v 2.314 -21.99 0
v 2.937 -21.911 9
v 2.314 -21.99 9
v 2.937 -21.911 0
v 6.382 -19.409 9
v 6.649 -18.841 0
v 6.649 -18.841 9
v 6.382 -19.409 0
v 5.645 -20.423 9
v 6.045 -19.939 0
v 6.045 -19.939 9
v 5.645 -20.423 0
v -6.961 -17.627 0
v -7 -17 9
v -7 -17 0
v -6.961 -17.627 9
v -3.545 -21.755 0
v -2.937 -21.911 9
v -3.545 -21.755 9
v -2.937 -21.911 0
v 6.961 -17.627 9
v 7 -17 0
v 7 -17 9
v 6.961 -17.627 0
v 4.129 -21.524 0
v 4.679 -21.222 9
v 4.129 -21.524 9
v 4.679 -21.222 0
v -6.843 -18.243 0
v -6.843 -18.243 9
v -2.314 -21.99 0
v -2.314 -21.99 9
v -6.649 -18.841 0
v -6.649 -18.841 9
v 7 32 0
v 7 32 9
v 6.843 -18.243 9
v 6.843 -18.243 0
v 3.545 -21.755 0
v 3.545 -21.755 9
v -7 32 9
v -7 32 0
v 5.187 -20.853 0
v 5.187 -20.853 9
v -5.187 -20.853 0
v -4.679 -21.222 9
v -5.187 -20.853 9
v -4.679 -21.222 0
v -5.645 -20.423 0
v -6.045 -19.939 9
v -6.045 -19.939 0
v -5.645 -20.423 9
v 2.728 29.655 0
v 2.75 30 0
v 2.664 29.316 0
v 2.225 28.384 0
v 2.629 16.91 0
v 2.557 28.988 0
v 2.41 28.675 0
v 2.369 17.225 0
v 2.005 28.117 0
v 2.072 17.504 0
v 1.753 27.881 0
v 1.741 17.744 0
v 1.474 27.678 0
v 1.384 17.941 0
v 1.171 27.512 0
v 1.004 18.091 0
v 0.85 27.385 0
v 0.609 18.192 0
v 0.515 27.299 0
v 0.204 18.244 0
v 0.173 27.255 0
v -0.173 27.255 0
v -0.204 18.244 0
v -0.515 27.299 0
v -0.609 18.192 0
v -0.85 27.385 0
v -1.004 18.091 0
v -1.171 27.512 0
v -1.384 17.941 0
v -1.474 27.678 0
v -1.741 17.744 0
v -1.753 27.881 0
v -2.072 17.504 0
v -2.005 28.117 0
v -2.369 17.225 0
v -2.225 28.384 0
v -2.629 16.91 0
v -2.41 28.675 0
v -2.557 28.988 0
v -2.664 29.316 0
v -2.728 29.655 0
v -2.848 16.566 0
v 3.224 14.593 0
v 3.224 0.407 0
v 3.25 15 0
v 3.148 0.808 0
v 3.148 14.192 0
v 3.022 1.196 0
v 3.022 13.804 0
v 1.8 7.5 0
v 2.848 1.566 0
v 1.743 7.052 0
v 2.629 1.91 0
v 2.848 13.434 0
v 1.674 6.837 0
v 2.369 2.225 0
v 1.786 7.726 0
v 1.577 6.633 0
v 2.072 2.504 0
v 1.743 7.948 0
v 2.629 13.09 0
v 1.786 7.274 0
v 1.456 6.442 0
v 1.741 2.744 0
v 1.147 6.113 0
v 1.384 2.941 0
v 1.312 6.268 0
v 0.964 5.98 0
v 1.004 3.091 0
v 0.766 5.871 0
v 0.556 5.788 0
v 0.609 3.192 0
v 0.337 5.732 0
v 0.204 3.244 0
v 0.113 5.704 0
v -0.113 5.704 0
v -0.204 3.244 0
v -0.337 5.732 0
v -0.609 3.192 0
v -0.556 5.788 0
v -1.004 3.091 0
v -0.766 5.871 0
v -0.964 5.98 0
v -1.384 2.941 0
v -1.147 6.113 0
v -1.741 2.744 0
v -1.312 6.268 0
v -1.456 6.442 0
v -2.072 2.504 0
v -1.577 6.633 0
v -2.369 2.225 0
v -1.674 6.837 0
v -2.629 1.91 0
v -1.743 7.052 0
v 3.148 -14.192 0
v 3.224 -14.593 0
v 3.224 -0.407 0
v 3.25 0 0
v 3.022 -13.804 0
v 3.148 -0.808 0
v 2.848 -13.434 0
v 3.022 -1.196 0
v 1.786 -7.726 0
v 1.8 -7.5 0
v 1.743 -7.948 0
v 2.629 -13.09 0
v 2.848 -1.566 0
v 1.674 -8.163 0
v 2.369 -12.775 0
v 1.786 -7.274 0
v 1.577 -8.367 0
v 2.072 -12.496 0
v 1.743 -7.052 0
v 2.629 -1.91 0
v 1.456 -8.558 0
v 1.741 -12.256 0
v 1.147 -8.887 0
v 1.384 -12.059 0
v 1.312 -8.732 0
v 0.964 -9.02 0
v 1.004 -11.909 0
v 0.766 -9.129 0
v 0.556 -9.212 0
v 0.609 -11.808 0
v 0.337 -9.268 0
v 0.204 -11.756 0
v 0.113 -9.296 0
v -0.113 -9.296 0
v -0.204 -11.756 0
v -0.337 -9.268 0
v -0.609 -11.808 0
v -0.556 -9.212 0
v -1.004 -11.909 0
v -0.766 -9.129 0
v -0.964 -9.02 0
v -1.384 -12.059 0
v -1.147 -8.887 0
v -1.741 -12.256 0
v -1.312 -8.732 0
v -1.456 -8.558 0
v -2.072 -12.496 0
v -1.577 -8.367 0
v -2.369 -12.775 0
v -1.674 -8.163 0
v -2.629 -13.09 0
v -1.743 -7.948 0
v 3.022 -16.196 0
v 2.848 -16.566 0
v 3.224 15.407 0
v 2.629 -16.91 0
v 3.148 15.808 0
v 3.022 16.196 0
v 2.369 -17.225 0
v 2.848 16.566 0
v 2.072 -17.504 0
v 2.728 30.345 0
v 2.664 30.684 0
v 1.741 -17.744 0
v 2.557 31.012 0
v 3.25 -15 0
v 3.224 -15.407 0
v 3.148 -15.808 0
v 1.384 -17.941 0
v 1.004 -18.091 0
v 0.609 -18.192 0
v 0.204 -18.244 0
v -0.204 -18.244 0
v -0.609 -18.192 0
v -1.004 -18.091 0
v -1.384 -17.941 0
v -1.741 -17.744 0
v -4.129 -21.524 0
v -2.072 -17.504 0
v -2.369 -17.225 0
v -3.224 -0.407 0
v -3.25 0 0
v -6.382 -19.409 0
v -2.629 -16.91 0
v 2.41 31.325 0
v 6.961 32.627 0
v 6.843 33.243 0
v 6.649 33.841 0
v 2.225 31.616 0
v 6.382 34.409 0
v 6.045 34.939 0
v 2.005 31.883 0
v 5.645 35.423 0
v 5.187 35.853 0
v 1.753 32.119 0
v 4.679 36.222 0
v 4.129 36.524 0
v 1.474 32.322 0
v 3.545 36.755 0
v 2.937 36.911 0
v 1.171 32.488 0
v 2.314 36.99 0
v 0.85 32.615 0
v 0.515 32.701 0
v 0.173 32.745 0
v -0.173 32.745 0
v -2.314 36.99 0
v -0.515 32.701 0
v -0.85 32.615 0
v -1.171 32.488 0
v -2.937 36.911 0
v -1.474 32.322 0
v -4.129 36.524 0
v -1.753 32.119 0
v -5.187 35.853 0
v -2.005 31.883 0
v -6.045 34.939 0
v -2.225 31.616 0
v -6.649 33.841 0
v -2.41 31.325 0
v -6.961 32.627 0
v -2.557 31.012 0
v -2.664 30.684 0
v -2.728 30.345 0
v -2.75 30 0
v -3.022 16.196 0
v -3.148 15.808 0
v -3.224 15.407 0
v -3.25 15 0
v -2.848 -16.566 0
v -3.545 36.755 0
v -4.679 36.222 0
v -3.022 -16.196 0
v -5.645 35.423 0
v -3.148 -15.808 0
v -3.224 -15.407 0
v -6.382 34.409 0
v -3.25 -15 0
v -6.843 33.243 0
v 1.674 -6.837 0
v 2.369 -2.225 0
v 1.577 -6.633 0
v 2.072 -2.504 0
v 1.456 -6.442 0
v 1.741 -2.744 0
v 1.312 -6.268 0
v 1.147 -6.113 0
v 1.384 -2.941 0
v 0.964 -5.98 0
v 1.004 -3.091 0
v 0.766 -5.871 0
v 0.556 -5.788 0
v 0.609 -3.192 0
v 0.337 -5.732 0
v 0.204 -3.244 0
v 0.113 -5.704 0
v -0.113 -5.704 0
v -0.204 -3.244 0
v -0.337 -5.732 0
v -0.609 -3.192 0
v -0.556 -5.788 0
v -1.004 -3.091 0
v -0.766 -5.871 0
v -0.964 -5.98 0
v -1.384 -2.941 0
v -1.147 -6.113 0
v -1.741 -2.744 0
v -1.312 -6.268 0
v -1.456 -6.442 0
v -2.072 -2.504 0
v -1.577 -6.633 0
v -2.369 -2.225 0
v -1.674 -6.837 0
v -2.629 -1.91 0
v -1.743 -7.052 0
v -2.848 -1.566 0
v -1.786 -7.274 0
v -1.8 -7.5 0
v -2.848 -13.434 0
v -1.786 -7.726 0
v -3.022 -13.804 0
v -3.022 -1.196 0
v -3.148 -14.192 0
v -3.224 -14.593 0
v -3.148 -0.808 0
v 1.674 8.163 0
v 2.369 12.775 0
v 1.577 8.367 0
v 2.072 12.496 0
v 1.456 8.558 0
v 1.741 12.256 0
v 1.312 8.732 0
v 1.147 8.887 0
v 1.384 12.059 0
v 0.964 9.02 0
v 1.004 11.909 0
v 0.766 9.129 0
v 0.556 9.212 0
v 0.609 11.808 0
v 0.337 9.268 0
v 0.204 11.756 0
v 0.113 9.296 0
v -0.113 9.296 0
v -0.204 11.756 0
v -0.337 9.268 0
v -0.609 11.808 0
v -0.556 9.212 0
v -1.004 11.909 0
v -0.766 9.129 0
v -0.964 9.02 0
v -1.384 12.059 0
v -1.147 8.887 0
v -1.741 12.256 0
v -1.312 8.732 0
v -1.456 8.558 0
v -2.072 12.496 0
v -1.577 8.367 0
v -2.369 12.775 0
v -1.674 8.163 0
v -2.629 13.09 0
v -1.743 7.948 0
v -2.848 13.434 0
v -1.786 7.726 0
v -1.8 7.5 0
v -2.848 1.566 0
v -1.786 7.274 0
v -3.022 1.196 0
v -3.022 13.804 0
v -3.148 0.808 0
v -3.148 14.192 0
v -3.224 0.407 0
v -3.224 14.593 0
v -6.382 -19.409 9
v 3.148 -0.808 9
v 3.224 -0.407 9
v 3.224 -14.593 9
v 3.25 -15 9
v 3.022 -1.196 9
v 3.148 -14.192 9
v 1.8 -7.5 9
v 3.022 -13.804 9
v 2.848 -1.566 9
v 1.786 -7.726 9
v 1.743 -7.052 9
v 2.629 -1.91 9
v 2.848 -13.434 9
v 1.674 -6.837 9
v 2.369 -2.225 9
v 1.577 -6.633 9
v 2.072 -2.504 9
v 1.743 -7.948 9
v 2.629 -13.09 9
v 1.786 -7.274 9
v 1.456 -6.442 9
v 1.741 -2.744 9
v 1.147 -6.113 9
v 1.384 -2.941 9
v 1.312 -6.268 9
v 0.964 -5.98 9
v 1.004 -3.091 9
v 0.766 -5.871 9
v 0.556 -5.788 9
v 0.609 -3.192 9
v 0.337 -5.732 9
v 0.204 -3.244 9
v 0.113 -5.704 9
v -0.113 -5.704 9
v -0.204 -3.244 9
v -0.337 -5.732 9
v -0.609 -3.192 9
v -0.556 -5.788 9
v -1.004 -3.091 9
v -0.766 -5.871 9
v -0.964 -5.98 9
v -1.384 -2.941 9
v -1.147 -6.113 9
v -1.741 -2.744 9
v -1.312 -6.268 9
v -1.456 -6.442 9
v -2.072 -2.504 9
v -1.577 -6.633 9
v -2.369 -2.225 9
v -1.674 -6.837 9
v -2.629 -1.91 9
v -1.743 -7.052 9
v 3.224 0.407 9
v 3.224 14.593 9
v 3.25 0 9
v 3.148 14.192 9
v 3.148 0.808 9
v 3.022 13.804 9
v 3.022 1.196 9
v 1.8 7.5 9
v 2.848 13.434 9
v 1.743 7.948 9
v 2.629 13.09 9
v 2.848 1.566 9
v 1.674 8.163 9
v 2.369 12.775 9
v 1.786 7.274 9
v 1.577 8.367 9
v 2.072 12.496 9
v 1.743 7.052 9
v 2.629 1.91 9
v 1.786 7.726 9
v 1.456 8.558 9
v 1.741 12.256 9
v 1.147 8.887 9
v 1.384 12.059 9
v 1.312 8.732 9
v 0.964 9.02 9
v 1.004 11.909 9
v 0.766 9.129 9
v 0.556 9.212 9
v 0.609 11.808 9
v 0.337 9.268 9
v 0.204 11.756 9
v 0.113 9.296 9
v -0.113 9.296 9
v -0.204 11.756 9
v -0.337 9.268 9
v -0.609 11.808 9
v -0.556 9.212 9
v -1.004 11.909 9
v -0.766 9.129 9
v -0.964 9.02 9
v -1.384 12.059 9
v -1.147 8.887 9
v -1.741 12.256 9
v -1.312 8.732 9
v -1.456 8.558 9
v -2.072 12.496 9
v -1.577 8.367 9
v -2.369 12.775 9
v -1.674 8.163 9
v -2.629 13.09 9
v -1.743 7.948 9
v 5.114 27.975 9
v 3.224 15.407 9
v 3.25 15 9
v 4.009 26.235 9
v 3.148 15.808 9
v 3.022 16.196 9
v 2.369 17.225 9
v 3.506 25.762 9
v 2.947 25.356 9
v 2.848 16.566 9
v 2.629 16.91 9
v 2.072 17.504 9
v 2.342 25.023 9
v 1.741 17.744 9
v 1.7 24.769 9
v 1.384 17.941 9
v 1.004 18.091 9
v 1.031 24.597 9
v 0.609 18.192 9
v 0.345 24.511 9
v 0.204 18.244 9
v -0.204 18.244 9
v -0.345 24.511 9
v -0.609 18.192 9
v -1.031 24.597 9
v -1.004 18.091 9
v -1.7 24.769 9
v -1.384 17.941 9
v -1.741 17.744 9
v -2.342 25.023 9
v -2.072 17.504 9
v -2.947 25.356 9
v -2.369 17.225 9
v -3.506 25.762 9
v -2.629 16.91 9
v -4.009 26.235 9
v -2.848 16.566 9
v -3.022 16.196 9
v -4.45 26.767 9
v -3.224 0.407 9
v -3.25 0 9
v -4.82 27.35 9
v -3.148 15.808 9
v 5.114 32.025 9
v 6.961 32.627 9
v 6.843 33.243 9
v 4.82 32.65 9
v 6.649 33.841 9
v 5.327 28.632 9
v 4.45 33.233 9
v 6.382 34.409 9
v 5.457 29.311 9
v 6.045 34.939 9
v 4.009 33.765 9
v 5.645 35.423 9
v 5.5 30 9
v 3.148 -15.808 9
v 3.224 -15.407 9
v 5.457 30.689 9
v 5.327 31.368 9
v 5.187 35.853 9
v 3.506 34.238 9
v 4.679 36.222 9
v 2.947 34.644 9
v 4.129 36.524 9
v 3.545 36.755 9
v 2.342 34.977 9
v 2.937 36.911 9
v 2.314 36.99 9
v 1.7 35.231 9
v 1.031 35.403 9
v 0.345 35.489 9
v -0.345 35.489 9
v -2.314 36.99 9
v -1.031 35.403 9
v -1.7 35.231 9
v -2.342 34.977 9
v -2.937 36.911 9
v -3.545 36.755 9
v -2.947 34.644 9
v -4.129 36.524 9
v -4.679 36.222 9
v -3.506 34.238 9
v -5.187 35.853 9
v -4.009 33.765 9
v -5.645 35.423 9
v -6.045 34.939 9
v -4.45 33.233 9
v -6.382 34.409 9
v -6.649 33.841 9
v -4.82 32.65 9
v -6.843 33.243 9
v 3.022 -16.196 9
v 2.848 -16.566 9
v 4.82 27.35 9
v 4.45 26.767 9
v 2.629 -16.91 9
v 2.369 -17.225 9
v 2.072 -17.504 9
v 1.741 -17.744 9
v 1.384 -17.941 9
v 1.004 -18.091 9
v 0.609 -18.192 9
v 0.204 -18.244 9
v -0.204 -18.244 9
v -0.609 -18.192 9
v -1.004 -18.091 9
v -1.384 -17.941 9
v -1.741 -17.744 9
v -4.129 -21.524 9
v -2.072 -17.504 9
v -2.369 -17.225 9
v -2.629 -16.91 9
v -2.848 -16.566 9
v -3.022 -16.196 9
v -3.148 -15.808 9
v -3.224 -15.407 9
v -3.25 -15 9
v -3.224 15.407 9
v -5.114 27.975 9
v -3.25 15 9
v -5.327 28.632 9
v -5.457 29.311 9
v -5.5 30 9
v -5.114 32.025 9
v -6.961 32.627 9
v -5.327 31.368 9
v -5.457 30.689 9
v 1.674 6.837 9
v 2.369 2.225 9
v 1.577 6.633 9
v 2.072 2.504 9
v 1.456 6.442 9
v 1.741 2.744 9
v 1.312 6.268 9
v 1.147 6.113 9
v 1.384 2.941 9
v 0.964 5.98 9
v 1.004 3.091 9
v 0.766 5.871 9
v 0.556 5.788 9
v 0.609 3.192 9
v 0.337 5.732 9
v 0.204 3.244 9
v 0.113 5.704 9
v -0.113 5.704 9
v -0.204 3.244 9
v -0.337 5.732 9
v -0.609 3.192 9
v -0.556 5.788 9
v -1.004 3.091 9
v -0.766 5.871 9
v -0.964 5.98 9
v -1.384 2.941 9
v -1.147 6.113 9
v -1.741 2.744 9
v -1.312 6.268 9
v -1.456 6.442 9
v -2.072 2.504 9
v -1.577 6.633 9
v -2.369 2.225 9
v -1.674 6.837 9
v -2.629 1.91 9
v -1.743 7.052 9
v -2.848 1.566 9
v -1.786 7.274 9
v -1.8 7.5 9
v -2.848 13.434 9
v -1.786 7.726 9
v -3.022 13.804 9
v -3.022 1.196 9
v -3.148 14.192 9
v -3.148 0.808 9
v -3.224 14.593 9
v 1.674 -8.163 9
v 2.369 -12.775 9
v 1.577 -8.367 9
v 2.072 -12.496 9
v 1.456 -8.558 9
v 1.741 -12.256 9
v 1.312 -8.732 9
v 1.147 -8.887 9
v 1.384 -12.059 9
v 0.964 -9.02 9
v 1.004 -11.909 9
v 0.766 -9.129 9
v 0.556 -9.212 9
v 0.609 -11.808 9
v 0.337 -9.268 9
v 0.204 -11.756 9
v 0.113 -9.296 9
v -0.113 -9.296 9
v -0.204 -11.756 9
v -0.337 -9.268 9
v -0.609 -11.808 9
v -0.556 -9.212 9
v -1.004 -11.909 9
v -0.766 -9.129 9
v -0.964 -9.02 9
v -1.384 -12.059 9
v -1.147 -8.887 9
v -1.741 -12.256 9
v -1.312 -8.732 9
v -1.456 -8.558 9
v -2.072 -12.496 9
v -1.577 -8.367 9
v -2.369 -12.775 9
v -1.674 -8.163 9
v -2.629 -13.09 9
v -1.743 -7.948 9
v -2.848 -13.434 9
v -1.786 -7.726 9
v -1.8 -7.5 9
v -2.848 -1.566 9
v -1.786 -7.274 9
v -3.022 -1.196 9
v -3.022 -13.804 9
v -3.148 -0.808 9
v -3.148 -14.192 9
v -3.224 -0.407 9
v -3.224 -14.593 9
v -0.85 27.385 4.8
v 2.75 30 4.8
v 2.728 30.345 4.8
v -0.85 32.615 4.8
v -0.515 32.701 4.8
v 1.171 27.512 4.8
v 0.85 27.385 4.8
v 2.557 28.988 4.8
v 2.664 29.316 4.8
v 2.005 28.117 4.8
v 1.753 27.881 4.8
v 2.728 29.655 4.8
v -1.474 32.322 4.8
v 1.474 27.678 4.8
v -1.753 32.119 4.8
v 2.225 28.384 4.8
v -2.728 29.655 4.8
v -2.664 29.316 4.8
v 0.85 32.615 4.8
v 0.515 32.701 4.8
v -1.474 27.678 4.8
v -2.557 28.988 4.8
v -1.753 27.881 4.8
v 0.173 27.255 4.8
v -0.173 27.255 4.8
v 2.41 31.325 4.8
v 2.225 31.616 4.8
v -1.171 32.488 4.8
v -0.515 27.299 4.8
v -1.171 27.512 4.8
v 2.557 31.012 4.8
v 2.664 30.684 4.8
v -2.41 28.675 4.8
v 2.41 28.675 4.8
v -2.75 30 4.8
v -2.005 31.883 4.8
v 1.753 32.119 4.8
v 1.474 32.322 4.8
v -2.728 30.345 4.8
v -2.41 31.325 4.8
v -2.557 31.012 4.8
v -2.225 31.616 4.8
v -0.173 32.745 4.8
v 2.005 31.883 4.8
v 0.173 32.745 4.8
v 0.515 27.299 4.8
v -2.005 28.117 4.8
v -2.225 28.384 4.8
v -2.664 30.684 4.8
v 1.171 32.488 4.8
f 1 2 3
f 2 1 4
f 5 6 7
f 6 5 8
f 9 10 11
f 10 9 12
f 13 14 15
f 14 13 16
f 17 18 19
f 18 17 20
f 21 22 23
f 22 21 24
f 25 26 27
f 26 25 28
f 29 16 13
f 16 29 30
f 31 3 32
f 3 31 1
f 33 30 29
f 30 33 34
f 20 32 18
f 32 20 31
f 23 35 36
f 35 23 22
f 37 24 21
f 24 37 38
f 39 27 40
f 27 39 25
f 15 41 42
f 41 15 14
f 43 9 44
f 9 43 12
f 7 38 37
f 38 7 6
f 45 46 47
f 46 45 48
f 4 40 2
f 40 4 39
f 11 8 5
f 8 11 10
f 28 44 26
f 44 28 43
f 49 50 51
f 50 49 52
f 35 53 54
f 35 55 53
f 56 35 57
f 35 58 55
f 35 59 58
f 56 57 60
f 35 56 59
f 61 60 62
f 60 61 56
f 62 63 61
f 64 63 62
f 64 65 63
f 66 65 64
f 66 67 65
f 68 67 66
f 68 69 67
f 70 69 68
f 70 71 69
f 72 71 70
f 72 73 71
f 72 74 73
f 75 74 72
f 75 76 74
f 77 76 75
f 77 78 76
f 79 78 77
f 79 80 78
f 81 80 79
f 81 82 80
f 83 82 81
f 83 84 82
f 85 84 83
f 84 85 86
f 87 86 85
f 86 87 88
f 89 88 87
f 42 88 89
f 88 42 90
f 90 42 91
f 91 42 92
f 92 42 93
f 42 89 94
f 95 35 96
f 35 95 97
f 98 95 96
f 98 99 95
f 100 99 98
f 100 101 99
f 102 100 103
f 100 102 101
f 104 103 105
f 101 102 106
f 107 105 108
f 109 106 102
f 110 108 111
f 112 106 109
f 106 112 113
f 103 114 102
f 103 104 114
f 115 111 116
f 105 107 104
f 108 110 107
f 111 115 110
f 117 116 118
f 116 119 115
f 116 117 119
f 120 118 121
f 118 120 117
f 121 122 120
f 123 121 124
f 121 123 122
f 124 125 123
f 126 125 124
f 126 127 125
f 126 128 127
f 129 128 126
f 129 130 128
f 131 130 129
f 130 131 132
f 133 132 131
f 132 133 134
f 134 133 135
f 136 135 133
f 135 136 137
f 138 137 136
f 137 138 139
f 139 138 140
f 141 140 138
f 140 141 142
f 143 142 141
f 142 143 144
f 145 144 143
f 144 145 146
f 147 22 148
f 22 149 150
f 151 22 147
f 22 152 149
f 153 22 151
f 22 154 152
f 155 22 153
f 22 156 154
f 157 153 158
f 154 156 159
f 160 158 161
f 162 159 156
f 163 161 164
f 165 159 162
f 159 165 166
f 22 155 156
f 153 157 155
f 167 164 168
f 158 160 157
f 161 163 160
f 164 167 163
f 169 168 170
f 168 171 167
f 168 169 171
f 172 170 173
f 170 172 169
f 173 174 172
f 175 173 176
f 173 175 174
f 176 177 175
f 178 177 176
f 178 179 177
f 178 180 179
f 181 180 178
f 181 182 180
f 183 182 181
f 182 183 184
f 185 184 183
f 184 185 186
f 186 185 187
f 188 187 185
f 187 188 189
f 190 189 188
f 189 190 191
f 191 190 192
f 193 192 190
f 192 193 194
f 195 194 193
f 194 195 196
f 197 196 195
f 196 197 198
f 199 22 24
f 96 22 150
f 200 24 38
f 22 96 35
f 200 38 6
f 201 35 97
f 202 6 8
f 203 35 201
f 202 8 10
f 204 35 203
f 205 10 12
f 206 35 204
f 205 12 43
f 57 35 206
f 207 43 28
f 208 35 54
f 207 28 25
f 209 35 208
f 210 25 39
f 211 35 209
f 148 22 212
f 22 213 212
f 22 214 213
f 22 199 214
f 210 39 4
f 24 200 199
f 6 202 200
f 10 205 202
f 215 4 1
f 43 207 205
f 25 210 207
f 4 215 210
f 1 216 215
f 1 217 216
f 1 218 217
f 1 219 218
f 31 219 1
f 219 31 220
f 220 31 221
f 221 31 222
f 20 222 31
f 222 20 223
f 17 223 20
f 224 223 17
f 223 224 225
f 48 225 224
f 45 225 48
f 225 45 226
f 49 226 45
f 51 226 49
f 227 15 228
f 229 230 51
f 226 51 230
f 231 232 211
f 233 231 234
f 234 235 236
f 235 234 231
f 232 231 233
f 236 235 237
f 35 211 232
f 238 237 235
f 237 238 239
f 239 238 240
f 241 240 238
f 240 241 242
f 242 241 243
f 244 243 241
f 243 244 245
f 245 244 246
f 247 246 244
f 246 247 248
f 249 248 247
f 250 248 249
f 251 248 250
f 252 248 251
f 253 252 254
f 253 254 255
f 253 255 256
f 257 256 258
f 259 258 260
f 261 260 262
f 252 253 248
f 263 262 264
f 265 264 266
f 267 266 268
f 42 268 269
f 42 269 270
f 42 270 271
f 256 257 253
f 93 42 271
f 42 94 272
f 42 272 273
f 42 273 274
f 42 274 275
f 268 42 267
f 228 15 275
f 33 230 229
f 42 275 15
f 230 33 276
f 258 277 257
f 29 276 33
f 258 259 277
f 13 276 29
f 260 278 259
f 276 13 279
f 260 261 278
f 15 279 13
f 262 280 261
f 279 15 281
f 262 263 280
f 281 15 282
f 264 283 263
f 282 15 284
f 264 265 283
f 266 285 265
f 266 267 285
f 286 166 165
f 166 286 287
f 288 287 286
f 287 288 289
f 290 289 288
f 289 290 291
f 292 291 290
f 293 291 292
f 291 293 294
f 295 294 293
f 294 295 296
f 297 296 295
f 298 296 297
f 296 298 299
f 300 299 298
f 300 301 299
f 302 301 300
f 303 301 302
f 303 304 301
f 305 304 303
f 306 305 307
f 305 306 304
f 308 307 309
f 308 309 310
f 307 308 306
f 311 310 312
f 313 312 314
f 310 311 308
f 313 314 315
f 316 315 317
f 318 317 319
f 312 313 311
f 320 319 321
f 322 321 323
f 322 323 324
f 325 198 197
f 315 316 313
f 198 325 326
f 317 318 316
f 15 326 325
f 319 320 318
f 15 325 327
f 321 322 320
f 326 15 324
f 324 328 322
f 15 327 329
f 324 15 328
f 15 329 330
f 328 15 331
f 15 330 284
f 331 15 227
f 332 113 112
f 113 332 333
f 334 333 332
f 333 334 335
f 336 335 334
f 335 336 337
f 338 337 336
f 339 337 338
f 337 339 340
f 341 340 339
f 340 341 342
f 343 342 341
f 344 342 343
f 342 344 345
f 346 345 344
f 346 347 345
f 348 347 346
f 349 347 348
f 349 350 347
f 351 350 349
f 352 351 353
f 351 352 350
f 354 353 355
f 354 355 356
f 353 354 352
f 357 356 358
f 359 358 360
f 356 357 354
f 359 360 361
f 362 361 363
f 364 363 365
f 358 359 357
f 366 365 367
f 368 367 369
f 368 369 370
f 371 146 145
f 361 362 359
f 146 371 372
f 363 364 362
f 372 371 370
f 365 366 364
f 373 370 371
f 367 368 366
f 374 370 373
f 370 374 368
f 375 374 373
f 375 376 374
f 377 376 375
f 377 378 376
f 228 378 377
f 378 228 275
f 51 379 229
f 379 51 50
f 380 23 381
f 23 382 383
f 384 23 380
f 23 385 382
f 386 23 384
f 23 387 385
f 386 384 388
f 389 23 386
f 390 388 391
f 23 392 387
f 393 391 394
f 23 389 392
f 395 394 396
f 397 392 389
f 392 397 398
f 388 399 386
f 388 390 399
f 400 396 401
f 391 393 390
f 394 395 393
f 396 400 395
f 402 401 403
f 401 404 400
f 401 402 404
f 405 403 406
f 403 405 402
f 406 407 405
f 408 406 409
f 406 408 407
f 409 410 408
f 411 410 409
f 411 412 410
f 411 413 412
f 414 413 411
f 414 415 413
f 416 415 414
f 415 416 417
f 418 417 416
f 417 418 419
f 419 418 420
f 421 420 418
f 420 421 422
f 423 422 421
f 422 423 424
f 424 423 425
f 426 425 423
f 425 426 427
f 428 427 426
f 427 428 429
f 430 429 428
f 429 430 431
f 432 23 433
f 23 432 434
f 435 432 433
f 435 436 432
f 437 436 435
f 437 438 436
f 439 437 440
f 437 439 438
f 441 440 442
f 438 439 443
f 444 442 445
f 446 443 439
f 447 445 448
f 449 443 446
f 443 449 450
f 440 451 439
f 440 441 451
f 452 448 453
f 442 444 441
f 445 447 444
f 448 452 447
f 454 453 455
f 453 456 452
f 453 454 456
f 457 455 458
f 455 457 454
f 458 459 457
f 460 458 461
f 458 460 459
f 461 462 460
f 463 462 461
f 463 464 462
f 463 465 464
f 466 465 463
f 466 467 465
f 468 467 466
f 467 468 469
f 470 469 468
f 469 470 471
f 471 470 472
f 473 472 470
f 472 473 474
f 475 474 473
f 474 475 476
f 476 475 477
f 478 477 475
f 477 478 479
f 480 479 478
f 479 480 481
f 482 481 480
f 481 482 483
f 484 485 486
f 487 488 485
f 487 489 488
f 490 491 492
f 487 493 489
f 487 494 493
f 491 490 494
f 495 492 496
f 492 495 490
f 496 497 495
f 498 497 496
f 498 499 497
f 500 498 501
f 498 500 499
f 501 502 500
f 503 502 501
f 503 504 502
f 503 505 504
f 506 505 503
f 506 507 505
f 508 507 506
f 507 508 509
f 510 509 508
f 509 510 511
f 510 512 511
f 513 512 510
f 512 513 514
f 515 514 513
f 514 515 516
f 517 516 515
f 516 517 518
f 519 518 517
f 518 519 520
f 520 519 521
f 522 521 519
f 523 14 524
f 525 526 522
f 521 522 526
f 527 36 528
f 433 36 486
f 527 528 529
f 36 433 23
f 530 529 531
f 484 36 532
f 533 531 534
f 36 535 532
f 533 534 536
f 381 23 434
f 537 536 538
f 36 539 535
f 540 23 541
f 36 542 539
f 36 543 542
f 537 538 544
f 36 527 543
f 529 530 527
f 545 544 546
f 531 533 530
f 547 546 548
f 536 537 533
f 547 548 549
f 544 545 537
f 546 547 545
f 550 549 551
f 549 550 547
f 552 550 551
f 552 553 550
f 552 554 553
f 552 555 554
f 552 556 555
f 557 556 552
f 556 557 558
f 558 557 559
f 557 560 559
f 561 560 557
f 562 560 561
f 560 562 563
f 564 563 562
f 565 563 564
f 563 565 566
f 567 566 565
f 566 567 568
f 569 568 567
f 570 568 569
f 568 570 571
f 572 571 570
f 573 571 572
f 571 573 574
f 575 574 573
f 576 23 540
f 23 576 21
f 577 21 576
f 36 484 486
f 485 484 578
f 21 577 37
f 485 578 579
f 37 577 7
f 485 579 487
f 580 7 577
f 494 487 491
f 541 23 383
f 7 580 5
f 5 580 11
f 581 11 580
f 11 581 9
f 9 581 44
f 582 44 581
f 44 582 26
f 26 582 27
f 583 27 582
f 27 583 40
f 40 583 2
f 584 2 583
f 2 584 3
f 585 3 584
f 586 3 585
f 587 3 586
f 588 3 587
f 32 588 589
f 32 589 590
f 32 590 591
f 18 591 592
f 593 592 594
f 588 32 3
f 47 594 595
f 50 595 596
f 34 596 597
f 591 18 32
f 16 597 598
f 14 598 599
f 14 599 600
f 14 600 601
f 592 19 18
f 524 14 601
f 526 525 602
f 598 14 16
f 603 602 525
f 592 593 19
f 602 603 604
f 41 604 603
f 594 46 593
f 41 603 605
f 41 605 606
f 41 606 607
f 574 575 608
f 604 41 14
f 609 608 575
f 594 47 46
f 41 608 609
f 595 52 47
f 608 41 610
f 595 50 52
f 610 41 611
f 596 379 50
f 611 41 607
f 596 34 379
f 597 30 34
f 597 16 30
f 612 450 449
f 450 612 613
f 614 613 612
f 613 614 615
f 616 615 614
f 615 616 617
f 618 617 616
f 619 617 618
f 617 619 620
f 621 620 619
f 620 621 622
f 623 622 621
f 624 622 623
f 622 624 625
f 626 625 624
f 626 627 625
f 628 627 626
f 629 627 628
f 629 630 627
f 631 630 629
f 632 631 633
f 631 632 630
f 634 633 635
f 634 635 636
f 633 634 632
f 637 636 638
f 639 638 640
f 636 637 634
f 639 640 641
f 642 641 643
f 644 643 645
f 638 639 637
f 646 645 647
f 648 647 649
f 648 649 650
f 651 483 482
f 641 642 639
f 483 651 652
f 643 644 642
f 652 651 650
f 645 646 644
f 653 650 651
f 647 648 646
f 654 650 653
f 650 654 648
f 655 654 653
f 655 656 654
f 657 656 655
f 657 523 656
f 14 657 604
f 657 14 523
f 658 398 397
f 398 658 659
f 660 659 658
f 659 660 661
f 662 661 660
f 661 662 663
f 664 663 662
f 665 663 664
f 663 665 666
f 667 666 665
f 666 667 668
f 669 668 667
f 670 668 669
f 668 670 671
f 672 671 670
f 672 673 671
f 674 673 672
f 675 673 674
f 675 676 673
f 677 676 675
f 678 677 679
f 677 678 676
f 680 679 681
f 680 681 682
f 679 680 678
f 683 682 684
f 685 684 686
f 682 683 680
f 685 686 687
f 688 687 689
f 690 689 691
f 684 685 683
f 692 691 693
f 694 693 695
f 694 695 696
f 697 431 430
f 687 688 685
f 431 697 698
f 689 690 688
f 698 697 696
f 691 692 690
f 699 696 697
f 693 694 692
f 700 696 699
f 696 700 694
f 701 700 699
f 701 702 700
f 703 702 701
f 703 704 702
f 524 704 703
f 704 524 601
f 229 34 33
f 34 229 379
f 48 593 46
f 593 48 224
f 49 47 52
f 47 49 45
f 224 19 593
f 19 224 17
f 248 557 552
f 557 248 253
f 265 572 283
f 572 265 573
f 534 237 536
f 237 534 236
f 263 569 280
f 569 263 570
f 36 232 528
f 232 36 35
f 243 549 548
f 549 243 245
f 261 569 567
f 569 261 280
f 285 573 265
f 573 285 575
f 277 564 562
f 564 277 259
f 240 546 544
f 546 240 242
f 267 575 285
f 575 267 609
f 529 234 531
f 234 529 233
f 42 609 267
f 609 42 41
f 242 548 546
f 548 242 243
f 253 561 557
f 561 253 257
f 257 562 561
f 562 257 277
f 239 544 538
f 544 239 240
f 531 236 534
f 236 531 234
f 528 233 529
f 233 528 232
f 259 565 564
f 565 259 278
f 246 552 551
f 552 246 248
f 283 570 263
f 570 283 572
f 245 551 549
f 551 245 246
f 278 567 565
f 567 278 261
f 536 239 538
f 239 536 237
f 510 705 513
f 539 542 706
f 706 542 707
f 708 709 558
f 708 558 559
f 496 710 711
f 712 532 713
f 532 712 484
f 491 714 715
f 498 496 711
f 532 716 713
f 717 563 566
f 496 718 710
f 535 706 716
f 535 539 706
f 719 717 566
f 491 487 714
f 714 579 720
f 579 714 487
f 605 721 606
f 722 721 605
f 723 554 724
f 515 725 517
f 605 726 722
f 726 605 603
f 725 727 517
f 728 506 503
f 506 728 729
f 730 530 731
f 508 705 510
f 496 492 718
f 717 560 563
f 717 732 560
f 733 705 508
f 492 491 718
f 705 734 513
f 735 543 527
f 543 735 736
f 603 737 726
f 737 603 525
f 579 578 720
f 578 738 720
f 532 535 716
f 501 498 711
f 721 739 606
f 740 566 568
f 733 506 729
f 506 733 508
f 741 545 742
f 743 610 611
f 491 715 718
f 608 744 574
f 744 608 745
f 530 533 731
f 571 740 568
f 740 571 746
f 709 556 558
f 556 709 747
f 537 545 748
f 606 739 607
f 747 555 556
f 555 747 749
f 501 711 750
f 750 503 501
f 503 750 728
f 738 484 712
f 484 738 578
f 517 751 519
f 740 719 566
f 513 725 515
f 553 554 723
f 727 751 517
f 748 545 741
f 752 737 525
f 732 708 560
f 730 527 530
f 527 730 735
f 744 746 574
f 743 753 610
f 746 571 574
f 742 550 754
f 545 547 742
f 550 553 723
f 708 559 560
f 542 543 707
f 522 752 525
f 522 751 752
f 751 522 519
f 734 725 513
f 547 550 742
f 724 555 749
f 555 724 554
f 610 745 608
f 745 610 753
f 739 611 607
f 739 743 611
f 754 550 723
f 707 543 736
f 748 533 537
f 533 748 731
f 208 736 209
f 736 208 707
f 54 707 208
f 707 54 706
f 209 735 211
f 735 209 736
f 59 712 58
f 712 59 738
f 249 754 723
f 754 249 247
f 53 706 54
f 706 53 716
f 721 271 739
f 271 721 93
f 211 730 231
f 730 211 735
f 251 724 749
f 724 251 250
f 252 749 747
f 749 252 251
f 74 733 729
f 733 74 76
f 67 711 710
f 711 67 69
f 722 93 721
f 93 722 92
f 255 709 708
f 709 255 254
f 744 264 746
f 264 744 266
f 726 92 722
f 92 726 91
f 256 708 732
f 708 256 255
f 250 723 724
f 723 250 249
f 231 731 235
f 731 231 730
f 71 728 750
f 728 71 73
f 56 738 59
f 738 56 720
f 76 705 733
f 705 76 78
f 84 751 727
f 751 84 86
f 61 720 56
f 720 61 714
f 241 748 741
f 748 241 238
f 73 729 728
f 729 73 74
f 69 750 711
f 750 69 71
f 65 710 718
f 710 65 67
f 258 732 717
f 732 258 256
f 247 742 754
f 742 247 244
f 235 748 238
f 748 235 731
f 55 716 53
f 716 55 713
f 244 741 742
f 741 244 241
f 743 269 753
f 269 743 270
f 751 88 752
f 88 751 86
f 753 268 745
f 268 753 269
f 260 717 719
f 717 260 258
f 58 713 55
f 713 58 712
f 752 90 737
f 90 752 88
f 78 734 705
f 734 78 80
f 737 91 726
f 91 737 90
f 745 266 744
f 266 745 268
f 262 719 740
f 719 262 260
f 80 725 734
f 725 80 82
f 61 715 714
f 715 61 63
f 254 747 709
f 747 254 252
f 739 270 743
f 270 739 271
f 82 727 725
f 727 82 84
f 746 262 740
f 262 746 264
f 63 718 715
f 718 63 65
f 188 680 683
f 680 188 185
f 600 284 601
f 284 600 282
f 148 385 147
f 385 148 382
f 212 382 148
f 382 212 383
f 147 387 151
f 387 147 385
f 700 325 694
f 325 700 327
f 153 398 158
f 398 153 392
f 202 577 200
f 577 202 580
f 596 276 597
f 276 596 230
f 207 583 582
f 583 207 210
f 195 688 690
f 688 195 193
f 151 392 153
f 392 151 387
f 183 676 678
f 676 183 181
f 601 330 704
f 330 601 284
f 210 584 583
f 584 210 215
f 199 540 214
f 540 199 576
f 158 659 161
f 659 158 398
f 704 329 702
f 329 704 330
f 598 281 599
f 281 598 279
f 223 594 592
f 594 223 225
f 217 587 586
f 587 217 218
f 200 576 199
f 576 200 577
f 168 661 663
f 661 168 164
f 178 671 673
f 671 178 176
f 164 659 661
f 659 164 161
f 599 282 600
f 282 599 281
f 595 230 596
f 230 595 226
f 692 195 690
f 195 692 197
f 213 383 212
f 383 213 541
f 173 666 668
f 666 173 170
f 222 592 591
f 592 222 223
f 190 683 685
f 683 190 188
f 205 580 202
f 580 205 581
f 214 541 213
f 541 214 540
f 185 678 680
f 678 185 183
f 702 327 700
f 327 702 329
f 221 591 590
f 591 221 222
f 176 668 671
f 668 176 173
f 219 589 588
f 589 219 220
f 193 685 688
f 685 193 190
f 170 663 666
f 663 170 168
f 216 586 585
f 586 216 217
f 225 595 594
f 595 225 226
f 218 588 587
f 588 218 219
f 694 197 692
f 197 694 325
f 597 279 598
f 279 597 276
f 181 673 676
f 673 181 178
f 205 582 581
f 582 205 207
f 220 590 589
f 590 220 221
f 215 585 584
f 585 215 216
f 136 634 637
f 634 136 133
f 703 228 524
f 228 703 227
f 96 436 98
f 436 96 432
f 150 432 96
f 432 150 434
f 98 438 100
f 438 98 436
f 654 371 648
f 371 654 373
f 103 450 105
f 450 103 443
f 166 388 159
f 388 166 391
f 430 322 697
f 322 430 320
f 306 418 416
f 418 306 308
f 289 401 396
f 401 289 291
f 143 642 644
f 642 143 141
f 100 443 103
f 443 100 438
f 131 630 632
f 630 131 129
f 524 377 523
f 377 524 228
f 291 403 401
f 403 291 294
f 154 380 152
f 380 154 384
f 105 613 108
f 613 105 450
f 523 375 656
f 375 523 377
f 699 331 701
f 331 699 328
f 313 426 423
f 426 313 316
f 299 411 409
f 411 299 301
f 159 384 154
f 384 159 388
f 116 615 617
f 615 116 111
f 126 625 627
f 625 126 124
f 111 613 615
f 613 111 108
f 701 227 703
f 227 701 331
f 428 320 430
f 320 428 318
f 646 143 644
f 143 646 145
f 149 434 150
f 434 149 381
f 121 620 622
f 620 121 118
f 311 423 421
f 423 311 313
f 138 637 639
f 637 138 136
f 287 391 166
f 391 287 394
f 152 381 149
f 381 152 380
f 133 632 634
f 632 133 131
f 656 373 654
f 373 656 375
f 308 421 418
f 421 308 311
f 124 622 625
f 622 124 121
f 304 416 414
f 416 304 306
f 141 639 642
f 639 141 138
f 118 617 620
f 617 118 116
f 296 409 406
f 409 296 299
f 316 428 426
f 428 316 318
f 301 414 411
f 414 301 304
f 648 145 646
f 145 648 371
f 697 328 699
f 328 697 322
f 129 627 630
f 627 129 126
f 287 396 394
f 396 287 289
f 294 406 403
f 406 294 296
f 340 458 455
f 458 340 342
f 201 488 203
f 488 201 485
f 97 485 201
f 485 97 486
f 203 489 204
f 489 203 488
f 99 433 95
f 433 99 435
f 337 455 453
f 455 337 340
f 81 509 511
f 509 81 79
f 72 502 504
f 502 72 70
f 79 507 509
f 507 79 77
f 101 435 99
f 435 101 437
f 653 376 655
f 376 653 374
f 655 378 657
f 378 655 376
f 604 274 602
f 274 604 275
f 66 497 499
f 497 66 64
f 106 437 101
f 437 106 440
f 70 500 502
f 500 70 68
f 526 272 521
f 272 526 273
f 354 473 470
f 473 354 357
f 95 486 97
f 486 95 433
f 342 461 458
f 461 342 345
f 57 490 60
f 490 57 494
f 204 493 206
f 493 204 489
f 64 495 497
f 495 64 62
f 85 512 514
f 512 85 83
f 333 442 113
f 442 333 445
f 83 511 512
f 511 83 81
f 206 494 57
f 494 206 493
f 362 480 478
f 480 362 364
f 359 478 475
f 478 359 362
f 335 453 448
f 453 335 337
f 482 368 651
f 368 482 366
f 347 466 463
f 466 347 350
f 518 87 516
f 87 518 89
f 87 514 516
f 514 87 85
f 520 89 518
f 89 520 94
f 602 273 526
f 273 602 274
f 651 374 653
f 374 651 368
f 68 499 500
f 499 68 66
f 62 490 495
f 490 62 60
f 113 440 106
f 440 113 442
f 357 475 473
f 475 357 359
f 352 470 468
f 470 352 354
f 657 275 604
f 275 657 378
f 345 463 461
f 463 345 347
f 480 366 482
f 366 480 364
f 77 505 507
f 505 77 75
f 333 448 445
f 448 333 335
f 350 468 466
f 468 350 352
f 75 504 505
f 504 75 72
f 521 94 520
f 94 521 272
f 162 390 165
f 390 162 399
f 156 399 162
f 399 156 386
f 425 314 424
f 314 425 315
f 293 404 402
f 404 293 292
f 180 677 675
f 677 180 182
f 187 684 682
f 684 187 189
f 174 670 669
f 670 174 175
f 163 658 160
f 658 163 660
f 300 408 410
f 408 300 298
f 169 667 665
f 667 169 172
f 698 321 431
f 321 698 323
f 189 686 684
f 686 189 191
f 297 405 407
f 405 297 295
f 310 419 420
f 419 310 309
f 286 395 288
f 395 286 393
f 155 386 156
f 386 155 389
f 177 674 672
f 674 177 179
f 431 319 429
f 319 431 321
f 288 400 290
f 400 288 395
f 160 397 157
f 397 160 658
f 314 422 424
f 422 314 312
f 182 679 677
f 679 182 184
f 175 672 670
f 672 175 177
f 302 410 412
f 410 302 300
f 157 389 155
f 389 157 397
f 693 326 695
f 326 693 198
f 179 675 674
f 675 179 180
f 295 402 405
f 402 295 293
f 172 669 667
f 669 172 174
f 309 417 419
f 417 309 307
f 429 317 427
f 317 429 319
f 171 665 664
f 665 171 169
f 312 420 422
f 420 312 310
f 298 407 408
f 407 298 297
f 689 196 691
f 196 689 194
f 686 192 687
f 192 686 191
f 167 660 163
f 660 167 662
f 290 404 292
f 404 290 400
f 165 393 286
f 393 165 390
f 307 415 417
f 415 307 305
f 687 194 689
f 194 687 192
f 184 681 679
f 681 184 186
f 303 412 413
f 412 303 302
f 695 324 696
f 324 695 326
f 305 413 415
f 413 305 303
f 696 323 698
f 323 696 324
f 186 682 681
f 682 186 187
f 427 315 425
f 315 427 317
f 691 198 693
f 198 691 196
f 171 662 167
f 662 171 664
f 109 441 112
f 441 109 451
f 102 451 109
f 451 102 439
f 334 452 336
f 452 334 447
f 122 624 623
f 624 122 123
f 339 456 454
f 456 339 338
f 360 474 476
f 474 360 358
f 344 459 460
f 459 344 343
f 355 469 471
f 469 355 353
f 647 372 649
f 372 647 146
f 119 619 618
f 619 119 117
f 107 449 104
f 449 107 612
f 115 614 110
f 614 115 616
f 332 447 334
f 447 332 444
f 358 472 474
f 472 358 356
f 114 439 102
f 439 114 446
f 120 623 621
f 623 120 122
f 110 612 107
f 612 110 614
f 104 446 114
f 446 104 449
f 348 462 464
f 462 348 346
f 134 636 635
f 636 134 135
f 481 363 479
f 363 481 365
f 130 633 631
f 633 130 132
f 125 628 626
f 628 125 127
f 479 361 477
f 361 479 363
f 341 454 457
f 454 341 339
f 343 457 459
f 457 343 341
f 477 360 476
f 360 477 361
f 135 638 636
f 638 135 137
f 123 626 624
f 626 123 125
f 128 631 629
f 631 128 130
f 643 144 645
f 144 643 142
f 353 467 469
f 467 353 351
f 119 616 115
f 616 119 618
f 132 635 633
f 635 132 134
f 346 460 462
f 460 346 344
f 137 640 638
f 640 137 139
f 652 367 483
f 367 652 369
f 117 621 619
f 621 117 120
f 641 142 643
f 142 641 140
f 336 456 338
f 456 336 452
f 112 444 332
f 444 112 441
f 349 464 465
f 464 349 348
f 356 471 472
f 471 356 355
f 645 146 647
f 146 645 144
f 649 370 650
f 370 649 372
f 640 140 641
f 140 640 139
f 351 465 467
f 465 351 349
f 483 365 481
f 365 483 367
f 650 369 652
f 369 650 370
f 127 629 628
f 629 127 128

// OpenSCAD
$fn = 50;


difference() {
	union() {
		hull() {
			translate(v = [-2.0000000000, 17.0000000000, 0]) {
				cylinder(h = 9, r = 5);
			}
			translate(v = [2.0000000000, 17.0000000000, 0]) {
				cylinder(h = 9, r = 5);
			}
			translate(v = [-2.0000000000, -17.0000000000, 0]) {
				cylinder(h = 9, r = 5);
			}
			translate(v = [2.0000000000, -17.0000000000, 0]) {
				cylinder(h = 9, r = 5);
			}
		}
		translate(v = [0.0000000000, 22.5000000000, 0]) {
			hull() {
				translate(v = [-2.0000000000, 9.5000000000, 0]) {
					cylinder(h = 9, r = 5);
				}
				translate(v = [2.0000000000, 9.5000000000, 0]) {
					cylinder(h = 9, r = 5);
				}
				translate(v = [-2.0000000000, -9.5000000000, 0]) {
					cylinder(h = 9, r = 5);
				}
				translate(v = [2.0000000000, -9.5000000000, 0]) {
					cylinder(h = 9, r = 5);
				}
			}
		}
		translate(v = [0.0000000000, 22.5000000000, 0]) {
			hull() {
				translate(v = [-2.0000000000, 9.5000000000, 0]) {
					cylinder(h = 9, r = 5);
				}
				translate(v = [2.0000000000, 9.5000000000, 0]) {
					cylinder(h = 9, r = 5);
				}
				translate(v = [-2.0000000000, -9.5000000000, 0]) {
					cylinder(h = 9, r = 5);
				}
				translate(v = [2.0000000000, -9.5000000000, 0]) {
					cylinder(h = 9, r = 5);
				}
			}
		}
	}
	union() {
		translate(v = [0.0000000000, 30.0000000000, 9]) {
			rotate(a = [0, 0, 0]) {
				difference() {
					union() {
						#translate(v = [0, 0, -9.0000000000]) {
							cylinder(h = 9, r = 2.2500000000);
						}
						#translate(v = [0, 0, -4.2000000000]) {
							cylinder(h = 4.2000000000, r1 = 2.7500000000, r2 = 5.5000000000);
						}
						#translate(v = [0, 0, -9.0000000000]) {
							cylinder(h = 9, r = 2.7500000000);
						}
						#translate(v = [0, 0, -9.0000000000]) {
							cylinder(h = 9, r = 2.2500000000);
						}
					}
					union();
				}
			}
		}
		translate(v = [0.0000000000, 30.0000000000, 9]) {
			rotate(a = [0, 0, 0]) {
				difference() {
					union() {
						#translate(v = [0, 0, -9.0000000000]) {
							cylinder(h = 9, r = 2.2500000000);
						}
						#translate(v = [0, 0, -4.2000000000]) {
							cylinder(h = 4.2000000000, r1 = 2.7500000000, r2 = 5.5000000000);
						}
						#translate(v = [0, 0, -9.0000000000]) {
							cylinder(h = 9, r = 2.7500000000);
						}
						#translate(v = [0, 0, -9.0000000000]) {
							cylinder(h = 9, r = 2.2500000000);
						}
					}
					union();
				}
			}
		}
		translate(v = [0.0000000000, -15.0000000000, 0]) {
			translate(v = [0, 0, -100]) {
				cylinder(h = 200, r = 3.2500000000);
			}
		}
		translate(v = [0, 0, -100]) {
			cylinder(h = 200, r = 3.2500000000);
		}
		translate(v = [0.0000000000, 15.0000000000, 0]) {
			translate(v = [0, 0, -100]) {
				cylinder(h = 200, r = 3.2500000000);
			}
		}
		translate(v = [0.0000000000, -15.0000000000, 0]) {
			translate(v = [0, 0, -100]) {
				cylinder(h = 200, r = 1.8000000000);
			}
		}
		translate(v = [0.0000000000, -7.5000000000, 0]) {
			translate(v = [0, 0, -100]) {
				cylinder(h = 200, r = 1.8000000000);
			}
		}
		translate(v = [0, 0, -100]) {
			cylinder(h = 200, r = 1.8000000000);
		}
		translate(v = [0.0000000000, 7.5000000000, 0]) {
			translate(v = [0, 0, -100]) {
				cylinder(h = 200, r = 1.8000000000);
			}
		}
		translate(v = [0.0000000000, 15.0000000000, 0]) {
			translate(v = [0, 0, -100]) {
				cylinder(h = 200, r = 1.8000000000);
			}
		}
	}
}
